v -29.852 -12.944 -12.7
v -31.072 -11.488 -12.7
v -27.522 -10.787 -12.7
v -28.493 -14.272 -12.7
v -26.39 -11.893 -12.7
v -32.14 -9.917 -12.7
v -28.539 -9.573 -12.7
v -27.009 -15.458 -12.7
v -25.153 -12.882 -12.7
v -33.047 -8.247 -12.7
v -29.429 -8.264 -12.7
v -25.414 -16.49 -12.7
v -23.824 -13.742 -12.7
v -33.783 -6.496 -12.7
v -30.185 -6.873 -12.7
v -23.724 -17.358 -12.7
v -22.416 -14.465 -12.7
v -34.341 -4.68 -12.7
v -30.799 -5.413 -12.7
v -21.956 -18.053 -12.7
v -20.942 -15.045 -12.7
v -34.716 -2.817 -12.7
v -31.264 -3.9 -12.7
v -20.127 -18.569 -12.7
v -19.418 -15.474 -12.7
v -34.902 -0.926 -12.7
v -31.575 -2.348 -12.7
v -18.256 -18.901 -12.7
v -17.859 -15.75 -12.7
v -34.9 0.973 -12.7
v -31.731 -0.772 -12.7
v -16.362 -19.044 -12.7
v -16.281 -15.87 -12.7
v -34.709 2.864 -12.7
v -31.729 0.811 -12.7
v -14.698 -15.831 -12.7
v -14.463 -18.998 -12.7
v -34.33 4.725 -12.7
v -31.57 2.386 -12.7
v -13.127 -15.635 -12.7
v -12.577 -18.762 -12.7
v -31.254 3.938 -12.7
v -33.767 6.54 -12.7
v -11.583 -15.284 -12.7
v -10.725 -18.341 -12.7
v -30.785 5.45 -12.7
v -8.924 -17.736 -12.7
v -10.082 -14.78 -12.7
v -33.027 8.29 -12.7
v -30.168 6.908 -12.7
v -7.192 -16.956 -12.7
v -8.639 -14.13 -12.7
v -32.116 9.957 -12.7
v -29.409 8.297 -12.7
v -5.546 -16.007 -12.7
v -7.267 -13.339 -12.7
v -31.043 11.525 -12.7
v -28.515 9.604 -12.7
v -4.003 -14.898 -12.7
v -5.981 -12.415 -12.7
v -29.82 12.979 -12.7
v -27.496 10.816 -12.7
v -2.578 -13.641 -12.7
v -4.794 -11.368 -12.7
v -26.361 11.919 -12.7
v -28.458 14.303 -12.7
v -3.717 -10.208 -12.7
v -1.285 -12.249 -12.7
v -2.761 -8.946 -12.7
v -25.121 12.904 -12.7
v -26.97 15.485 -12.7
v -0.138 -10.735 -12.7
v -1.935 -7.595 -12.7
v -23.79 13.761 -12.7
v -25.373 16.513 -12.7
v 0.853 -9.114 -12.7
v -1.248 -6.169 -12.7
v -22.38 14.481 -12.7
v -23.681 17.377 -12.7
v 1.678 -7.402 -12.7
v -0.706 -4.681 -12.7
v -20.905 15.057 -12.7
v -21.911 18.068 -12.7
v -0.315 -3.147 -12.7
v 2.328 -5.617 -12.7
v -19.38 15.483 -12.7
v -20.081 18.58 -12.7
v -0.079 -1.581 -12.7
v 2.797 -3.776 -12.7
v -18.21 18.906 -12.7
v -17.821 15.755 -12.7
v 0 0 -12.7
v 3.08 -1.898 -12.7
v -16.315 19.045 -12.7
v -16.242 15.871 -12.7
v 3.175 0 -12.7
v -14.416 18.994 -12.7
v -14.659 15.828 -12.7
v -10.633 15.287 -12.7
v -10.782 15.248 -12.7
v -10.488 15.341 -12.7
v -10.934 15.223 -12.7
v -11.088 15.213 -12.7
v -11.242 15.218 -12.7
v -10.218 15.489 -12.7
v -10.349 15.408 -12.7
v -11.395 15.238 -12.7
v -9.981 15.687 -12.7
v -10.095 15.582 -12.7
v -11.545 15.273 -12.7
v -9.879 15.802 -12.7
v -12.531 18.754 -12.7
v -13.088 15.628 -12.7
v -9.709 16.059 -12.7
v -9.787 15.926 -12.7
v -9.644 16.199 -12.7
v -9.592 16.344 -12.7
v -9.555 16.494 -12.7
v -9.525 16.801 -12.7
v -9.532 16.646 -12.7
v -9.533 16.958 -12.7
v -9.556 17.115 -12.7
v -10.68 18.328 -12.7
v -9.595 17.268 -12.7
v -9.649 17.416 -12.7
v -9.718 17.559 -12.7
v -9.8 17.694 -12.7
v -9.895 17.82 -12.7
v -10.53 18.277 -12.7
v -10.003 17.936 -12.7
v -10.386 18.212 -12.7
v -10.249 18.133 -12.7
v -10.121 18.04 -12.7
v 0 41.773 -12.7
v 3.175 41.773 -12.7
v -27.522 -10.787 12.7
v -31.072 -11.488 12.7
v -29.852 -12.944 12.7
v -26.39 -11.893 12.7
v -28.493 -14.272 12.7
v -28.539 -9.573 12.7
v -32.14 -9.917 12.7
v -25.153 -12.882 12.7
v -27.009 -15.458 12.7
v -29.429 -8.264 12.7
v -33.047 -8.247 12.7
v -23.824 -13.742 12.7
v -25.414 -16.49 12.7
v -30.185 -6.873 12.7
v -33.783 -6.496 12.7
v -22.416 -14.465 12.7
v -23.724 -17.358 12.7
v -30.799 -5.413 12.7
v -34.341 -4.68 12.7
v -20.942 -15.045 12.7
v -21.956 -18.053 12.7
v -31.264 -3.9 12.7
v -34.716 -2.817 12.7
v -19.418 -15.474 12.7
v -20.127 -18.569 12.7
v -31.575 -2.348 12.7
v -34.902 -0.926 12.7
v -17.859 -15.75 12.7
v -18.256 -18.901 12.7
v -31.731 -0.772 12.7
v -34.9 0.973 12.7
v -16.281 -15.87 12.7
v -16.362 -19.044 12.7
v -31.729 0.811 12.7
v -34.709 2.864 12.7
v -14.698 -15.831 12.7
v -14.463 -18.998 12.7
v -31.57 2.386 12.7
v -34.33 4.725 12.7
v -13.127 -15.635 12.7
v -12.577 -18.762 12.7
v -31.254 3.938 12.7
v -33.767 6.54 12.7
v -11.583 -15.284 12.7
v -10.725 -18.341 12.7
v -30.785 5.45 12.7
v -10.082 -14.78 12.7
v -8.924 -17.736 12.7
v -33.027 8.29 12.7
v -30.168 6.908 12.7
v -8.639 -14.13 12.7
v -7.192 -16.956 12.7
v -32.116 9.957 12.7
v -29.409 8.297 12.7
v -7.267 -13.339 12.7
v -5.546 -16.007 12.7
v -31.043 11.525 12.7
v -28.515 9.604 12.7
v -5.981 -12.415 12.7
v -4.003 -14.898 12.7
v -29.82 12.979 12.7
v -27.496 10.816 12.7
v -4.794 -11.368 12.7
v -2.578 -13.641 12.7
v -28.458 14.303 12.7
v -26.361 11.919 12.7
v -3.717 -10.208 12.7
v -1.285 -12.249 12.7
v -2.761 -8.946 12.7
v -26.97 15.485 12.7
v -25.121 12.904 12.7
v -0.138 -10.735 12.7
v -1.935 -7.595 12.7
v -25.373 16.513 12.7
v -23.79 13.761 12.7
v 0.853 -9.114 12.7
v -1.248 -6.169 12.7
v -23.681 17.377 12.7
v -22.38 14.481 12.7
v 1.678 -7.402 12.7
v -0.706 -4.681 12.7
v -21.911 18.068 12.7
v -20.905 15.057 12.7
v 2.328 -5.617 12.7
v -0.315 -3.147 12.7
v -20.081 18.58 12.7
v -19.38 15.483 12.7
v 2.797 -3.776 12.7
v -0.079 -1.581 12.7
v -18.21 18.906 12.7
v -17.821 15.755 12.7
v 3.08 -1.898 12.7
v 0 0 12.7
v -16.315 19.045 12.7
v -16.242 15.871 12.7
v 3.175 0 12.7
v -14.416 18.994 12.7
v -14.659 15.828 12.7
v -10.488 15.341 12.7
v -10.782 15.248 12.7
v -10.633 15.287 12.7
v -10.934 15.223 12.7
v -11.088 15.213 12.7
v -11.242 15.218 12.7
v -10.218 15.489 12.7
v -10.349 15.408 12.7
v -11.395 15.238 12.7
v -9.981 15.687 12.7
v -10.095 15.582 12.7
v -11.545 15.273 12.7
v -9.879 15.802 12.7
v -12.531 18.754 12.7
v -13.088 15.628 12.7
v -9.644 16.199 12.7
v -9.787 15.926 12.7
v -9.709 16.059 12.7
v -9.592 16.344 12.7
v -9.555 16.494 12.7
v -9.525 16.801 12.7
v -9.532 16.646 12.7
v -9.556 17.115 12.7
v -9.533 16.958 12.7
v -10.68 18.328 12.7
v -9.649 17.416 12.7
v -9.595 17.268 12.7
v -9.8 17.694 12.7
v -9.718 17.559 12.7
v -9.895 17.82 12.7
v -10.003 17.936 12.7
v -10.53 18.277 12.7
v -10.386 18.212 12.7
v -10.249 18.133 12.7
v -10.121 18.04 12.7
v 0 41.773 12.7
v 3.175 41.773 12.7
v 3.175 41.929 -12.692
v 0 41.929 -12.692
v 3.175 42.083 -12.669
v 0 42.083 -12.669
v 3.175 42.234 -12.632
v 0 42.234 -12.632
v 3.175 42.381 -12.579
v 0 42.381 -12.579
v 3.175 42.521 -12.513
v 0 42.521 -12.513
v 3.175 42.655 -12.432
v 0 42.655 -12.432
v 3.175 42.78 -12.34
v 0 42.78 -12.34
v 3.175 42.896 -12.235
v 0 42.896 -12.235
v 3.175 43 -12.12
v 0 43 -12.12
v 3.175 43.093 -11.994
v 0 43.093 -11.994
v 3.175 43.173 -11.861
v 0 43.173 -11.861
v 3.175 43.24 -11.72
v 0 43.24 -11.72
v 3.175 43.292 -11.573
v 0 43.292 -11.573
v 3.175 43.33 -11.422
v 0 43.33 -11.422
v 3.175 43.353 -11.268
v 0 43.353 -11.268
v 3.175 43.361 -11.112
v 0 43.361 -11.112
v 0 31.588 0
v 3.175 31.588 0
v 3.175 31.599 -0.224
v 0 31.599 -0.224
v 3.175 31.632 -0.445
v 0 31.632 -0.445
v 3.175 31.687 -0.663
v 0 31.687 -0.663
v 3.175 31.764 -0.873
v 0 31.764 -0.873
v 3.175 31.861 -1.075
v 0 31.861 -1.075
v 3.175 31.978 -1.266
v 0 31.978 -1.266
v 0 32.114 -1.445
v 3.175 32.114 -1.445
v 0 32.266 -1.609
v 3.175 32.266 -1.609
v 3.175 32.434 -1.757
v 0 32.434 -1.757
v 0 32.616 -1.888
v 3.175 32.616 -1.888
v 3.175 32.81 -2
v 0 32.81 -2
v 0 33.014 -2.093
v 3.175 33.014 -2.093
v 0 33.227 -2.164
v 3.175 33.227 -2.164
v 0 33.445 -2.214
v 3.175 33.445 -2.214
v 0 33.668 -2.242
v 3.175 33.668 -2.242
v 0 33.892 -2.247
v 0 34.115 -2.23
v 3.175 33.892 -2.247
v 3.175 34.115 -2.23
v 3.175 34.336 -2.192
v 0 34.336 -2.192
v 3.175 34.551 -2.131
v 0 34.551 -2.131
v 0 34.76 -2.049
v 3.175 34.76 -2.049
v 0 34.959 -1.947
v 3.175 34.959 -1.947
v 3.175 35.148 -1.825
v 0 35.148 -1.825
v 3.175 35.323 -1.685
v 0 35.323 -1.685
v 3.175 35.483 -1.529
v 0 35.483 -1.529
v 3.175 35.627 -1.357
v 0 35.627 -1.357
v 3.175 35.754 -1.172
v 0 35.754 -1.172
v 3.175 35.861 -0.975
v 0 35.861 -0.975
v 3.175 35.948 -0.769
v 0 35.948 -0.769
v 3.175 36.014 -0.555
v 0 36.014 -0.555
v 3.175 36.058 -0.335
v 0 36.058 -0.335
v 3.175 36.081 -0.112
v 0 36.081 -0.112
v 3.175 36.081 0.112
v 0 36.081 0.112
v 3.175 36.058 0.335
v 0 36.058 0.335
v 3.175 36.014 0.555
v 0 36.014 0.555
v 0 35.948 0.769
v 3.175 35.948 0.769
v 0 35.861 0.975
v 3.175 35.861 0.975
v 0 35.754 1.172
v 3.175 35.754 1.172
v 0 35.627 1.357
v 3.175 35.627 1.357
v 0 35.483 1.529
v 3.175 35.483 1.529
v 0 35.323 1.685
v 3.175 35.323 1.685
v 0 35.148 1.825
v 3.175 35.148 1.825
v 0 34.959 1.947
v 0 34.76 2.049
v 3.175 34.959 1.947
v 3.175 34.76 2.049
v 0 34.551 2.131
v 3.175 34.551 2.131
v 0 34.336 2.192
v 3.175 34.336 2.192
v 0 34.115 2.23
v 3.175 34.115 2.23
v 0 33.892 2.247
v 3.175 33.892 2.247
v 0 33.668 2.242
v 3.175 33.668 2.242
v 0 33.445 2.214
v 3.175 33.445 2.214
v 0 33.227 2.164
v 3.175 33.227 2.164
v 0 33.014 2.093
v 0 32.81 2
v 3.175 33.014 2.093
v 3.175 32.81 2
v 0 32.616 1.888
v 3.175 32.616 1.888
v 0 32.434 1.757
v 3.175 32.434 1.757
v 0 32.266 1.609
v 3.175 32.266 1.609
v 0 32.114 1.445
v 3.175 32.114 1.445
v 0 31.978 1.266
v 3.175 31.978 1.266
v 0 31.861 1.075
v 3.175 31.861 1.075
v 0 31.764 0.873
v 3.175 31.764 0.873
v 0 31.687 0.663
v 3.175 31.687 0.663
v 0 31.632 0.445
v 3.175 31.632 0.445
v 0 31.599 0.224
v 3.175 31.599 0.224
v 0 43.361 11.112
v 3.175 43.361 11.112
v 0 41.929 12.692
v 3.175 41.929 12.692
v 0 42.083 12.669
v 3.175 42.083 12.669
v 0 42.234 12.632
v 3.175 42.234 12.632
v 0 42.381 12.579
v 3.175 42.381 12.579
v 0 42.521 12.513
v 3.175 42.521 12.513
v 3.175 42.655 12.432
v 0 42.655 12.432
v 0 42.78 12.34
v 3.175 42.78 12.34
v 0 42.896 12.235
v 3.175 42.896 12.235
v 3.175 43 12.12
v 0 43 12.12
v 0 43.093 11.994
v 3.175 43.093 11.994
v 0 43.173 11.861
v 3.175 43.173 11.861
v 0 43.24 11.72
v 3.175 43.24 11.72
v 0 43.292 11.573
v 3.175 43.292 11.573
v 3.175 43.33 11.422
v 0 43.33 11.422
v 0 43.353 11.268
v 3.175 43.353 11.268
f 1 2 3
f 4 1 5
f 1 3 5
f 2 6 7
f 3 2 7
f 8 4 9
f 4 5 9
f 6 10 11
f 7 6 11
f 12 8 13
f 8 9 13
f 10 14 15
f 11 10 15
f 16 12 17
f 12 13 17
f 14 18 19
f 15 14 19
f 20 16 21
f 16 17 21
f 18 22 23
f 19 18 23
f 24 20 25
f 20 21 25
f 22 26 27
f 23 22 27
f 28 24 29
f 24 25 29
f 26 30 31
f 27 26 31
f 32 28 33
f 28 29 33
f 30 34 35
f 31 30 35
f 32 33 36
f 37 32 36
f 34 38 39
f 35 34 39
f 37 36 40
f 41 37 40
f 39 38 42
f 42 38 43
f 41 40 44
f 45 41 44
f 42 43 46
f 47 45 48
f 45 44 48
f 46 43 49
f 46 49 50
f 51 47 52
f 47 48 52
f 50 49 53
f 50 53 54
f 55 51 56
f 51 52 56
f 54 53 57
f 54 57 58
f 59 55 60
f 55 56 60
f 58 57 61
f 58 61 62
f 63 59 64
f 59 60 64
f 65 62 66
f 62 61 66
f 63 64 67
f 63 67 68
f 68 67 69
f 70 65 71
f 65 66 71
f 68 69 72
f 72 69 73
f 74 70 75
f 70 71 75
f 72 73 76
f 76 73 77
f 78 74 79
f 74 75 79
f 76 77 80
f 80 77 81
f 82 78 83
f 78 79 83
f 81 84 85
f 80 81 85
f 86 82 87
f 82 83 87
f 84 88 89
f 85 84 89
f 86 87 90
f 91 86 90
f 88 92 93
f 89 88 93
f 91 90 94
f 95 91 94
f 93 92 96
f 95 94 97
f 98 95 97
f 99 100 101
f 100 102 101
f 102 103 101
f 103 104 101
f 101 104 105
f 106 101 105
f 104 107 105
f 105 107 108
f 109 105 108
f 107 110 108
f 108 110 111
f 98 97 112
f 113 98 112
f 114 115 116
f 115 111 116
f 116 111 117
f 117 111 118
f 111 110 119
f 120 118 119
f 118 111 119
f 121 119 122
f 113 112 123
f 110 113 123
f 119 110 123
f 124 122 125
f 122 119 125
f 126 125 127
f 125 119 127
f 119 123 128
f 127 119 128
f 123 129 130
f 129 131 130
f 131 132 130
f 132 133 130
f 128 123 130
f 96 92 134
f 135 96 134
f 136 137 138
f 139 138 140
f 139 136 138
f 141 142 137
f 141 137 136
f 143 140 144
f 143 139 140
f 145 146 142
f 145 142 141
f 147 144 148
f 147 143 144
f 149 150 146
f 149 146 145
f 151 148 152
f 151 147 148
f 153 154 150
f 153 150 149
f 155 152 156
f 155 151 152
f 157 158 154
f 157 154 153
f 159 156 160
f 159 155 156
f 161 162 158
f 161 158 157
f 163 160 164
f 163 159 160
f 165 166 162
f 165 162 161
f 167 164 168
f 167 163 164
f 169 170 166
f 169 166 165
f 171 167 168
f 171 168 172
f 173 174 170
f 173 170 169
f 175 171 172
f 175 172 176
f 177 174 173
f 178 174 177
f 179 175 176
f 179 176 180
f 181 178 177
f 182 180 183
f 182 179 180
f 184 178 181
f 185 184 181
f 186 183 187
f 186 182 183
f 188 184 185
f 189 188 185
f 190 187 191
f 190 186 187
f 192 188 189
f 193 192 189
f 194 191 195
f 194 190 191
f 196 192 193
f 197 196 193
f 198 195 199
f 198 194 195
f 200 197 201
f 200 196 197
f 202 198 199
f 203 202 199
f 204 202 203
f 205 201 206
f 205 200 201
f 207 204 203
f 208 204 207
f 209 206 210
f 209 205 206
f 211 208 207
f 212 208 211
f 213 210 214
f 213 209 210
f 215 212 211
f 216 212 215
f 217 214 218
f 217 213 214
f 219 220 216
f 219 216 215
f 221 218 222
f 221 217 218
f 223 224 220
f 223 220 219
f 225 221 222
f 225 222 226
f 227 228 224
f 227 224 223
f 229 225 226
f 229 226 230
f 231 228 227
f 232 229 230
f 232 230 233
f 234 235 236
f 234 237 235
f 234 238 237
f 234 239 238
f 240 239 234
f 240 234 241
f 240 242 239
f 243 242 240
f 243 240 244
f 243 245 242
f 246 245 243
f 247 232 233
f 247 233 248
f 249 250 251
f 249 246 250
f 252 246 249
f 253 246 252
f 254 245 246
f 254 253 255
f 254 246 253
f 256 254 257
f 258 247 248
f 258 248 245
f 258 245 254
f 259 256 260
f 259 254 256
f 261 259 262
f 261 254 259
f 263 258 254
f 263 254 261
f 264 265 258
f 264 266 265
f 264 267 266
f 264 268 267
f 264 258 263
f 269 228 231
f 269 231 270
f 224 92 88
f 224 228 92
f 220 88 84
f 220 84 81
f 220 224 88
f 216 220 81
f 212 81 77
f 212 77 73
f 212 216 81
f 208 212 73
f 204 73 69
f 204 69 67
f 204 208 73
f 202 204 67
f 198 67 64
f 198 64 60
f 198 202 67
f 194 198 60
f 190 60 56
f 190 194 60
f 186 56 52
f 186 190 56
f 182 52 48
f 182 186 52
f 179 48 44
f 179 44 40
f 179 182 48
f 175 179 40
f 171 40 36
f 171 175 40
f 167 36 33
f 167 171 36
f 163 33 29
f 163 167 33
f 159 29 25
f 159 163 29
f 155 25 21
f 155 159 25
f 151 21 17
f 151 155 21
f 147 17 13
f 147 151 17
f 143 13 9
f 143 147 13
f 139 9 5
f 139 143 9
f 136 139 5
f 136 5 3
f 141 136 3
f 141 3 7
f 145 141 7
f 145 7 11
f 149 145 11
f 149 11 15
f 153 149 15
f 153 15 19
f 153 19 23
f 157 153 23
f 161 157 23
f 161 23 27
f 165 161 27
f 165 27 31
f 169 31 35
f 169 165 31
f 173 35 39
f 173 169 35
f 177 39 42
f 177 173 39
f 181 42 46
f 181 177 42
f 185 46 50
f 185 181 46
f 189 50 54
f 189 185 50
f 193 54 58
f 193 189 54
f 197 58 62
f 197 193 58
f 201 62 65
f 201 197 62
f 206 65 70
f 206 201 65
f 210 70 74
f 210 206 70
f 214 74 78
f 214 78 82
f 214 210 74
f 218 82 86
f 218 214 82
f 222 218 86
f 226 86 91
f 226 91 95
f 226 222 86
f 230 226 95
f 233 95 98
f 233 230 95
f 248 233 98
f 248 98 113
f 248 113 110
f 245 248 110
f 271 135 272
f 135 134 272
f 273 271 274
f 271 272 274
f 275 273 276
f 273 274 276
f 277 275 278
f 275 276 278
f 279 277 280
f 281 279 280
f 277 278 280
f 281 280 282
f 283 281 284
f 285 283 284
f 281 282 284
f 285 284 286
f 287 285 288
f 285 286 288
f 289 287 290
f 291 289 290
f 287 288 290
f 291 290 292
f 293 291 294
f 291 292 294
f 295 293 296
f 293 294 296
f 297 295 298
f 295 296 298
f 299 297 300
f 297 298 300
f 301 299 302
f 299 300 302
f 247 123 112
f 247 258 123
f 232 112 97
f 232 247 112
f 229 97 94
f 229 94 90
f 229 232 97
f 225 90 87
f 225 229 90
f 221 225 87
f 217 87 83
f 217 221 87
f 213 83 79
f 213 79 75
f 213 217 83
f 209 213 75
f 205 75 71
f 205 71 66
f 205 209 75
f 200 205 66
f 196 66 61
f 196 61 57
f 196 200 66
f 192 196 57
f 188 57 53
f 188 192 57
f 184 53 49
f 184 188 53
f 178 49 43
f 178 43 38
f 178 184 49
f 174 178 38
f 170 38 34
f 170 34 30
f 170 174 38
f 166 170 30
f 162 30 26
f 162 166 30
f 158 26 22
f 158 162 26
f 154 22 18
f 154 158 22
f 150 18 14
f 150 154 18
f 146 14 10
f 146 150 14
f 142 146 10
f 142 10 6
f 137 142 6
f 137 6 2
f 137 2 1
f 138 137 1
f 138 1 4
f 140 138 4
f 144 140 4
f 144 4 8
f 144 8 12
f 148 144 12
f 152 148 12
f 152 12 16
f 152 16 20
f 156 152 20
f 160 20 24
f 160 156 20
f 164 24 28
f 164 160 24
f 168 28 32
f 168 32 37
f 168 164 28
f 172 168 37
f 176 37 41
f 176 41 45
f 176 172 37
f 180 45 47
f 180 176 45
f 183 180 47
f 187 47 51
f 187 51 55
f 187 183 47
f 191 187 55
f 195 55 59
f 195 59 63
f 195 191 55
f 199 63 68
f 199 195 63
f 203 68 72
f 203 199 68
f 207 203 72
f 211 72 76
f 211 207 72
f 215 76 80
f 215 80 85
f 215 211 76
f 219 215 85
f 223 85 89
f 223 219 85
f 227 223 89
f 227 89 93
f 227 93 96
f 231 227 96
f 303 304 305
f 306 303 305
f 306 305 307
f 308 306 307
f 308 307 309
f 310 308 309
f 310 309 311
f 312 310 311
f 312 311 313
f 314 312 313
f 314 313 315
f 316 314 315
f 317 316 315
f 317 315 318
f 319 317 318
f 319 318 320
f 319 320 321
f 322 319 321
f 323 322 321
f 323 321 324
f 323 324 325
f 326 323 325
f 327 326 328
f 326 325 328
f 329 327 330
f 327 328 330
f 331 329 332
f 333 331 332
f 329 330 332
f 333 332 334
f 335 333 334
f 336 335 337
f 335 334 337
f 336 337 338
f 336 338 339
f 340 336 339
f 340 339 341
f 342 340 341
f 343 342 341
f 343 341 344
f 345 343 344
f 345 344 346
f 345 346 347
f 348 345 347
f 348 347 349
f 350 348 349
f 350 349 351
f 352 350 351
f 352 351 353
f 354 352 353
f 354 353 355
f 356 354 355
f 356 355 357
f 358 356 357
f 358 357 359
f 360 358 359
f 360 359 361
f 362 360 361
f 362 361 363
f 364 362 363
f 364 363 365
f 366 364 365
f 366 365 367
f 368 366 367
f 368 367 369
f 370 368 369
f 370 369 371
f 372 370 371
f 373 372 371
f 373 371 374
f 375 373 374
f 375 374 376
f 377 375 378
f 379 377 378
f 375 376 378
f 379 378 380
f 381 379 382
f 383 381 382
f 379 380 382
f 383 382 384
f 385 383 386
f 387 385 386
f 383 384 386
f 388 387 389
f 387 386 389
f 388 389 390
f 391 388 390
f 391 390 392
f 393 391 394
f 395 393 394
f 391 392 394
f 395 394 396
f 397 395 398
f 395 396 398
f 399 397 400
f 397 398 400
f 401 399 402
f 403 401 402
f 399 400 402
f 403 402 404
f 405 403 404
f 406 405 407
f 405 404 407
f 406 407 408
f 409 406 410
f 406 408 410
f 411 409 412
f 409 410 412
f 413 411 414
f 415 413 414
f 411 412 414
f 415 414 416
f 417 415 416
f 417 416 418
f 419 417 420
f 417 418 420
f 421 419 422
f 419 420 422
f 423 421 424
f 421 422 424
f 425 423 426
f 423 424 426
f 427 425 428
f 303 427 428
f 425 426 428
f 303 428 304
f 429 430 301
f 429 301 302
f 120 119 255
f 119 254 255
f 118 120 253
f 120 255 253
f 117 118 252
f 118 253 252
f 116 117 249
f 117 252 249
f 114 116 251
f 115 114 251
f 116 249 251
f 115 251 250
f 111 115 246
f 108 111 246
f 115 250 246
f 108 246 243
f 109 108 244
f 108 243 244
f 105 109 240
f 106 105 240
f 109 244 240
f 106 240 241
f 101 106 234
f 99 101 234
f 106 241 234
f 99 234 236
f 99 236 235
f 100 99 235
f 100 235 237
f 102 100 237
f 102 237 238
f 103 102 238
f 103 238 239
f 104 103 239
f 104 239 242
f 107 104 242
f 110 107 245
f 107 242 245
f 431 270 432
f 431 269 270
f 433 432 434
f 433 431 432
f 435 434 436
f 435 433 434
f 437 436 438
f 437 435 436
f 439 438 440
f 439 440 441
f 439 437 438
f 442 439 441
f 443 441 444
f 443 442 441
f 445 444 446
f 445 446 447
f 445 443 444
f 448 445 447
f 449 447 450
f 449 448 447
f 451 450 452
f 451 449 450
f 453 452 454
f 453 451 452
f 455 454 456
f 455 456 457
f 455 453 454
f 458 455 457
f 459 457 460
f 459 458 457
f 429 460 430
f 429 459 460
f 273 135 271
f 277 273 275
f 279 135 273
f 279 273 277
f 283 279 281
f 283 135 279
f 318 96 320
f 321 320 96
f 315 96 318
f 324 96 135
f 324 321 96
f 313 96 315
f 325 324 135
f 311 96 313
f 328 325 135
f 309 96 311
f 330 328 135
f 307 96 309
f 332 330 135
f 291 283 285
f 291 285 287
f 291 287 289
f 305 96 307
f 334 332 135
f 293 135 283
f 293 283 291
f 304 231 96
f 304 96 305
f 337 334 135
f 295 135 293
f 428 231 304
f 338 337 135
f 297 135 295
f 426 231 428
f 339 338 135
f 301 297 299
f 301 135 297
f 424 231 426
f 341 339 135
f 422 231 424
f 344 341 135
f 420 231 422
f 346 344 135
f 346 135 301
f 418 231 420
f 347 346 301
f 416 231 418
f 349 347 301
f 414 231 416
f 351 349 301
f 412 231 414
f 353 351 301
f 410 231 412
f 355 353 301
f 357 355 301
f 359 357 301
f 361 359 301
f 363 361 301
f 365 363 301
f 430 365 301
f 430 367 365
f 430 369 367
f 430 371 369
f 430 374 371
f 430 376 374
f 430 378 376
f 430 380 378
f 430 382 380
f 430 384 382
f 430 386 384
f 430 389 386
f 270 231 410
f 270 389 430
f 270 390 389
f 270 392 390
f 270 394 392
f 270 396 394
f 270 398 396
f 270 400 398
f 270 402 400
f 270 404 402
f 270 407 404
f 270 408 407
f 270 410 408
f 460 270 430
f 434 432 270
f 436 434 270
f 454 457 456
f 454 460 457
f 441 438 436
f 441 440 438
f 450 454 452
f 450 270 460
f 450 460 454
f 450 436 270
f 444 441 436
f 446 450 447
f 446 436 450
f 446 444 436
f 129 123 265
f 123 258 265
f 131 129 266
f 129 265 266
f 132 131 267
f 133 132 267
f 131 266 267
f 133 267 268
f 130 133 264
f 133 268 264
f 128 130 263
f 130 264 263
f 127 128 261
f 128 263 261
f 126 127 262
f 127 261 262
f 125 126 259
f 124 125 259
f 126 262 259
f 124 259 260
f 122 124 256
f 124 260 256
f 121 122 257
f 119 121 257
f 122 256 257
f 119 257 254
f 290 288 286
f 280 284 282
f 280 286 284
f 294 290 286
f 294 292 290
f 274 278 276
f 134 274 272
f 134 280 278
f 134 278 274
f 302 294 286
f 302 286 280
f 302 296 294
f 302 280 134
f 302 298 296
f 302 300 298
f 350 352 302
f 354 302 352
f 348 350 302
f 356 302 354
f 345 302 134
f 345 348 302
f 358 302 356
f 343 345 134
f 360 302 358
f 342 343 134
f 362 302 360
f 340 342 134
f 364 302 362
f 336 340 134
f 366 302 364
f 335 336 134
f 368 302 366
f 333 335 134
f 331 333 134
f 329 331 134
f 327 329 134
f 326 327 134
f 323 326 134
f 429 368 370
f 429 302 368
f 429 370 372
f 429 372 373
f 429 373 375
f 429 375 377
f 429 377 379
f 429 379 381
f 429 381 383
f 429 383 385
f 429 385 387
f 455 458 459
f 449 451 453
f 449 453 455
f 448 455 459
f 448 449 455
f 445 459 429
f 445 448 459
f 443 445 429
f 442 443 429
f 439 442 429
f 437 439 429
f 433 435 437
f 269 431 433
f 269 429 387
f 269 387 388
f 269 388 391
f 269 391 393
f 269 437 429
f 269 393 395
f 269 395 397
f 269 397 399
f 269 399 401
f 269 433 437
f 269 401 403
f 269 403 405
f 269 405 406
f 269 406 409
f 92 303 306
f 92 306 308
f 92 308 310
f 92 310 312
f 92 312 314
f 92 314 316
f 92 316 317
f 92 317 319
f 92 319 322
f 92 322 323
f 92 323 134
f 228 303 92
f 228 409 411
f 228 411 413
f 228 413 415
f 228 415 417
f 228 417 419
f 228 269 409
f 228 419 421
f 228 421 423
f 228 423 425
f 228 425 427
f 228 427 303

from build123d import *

# Parameters (mm, degrees)
F1_DEPTH = 12.7
F2_R     = 1.58749
F3_R     = 1.5875
F5_D     = 4.4958


# Not quite as in the source:
# - a fillet or chamfer is up to 0.001 mm smaller than in the source, because OpenCascade refuses the exact size


with BuildPart() as f1:
    # F0 (on Top) → F1 (new body, symmetric)
    with BuildSketch(Plane.XY):
        with BuildLine():
            Line((0, 43.3605122421), (0, 0))
            ThreePointArc((0, 0), (-29.1569779212, -8.6950956004), (-9.525, 14.5496778315))
            Line((-9.525, 14.5496778315), (-9.525, 17.9605122421))
            ThreePointArc((-9.525, 17.9605122421), (-31.4292598667, -10.9985226281), (3.175, 0))
            Line((3.175, 0), (3.175, 43.3605122421))
            Line((3.175, 43.3605122421), (0, 43.3605122421))
        make_face()
    extrude(amount=F1_DEPTH, both=True)

    # F2 (radius 1.5875 in the source; OpenCascade refuses exactly that, so slightly less here)
    f2_edges = [f1.edges().sort_by_distance(p)[0] for p in [
        (-9.525, 14.549678, 0),
        (-9.525, 17.960512, 0),
    ]]
    fillet(f2_edges, radius=F2_R)

    # F3
    f3_edges = [f1.edges().sort_by_distance(p)[0] for p in [
        (1.5875, 43.360512, 12.7),
        (1.5875, 43.360512, -12.7),
    ]]
    fillet(f3_edges, radius=F3_R)

    # F5 (through all)
    with Locations(Plane(origin=(0, 0, 0), x_dir=(0, 1, 0), z_dir=(-1, 0, 0))):
        with Locations((33.8355122421, 0)):
            Hole(F5_D / 2)


solid = f1.part
